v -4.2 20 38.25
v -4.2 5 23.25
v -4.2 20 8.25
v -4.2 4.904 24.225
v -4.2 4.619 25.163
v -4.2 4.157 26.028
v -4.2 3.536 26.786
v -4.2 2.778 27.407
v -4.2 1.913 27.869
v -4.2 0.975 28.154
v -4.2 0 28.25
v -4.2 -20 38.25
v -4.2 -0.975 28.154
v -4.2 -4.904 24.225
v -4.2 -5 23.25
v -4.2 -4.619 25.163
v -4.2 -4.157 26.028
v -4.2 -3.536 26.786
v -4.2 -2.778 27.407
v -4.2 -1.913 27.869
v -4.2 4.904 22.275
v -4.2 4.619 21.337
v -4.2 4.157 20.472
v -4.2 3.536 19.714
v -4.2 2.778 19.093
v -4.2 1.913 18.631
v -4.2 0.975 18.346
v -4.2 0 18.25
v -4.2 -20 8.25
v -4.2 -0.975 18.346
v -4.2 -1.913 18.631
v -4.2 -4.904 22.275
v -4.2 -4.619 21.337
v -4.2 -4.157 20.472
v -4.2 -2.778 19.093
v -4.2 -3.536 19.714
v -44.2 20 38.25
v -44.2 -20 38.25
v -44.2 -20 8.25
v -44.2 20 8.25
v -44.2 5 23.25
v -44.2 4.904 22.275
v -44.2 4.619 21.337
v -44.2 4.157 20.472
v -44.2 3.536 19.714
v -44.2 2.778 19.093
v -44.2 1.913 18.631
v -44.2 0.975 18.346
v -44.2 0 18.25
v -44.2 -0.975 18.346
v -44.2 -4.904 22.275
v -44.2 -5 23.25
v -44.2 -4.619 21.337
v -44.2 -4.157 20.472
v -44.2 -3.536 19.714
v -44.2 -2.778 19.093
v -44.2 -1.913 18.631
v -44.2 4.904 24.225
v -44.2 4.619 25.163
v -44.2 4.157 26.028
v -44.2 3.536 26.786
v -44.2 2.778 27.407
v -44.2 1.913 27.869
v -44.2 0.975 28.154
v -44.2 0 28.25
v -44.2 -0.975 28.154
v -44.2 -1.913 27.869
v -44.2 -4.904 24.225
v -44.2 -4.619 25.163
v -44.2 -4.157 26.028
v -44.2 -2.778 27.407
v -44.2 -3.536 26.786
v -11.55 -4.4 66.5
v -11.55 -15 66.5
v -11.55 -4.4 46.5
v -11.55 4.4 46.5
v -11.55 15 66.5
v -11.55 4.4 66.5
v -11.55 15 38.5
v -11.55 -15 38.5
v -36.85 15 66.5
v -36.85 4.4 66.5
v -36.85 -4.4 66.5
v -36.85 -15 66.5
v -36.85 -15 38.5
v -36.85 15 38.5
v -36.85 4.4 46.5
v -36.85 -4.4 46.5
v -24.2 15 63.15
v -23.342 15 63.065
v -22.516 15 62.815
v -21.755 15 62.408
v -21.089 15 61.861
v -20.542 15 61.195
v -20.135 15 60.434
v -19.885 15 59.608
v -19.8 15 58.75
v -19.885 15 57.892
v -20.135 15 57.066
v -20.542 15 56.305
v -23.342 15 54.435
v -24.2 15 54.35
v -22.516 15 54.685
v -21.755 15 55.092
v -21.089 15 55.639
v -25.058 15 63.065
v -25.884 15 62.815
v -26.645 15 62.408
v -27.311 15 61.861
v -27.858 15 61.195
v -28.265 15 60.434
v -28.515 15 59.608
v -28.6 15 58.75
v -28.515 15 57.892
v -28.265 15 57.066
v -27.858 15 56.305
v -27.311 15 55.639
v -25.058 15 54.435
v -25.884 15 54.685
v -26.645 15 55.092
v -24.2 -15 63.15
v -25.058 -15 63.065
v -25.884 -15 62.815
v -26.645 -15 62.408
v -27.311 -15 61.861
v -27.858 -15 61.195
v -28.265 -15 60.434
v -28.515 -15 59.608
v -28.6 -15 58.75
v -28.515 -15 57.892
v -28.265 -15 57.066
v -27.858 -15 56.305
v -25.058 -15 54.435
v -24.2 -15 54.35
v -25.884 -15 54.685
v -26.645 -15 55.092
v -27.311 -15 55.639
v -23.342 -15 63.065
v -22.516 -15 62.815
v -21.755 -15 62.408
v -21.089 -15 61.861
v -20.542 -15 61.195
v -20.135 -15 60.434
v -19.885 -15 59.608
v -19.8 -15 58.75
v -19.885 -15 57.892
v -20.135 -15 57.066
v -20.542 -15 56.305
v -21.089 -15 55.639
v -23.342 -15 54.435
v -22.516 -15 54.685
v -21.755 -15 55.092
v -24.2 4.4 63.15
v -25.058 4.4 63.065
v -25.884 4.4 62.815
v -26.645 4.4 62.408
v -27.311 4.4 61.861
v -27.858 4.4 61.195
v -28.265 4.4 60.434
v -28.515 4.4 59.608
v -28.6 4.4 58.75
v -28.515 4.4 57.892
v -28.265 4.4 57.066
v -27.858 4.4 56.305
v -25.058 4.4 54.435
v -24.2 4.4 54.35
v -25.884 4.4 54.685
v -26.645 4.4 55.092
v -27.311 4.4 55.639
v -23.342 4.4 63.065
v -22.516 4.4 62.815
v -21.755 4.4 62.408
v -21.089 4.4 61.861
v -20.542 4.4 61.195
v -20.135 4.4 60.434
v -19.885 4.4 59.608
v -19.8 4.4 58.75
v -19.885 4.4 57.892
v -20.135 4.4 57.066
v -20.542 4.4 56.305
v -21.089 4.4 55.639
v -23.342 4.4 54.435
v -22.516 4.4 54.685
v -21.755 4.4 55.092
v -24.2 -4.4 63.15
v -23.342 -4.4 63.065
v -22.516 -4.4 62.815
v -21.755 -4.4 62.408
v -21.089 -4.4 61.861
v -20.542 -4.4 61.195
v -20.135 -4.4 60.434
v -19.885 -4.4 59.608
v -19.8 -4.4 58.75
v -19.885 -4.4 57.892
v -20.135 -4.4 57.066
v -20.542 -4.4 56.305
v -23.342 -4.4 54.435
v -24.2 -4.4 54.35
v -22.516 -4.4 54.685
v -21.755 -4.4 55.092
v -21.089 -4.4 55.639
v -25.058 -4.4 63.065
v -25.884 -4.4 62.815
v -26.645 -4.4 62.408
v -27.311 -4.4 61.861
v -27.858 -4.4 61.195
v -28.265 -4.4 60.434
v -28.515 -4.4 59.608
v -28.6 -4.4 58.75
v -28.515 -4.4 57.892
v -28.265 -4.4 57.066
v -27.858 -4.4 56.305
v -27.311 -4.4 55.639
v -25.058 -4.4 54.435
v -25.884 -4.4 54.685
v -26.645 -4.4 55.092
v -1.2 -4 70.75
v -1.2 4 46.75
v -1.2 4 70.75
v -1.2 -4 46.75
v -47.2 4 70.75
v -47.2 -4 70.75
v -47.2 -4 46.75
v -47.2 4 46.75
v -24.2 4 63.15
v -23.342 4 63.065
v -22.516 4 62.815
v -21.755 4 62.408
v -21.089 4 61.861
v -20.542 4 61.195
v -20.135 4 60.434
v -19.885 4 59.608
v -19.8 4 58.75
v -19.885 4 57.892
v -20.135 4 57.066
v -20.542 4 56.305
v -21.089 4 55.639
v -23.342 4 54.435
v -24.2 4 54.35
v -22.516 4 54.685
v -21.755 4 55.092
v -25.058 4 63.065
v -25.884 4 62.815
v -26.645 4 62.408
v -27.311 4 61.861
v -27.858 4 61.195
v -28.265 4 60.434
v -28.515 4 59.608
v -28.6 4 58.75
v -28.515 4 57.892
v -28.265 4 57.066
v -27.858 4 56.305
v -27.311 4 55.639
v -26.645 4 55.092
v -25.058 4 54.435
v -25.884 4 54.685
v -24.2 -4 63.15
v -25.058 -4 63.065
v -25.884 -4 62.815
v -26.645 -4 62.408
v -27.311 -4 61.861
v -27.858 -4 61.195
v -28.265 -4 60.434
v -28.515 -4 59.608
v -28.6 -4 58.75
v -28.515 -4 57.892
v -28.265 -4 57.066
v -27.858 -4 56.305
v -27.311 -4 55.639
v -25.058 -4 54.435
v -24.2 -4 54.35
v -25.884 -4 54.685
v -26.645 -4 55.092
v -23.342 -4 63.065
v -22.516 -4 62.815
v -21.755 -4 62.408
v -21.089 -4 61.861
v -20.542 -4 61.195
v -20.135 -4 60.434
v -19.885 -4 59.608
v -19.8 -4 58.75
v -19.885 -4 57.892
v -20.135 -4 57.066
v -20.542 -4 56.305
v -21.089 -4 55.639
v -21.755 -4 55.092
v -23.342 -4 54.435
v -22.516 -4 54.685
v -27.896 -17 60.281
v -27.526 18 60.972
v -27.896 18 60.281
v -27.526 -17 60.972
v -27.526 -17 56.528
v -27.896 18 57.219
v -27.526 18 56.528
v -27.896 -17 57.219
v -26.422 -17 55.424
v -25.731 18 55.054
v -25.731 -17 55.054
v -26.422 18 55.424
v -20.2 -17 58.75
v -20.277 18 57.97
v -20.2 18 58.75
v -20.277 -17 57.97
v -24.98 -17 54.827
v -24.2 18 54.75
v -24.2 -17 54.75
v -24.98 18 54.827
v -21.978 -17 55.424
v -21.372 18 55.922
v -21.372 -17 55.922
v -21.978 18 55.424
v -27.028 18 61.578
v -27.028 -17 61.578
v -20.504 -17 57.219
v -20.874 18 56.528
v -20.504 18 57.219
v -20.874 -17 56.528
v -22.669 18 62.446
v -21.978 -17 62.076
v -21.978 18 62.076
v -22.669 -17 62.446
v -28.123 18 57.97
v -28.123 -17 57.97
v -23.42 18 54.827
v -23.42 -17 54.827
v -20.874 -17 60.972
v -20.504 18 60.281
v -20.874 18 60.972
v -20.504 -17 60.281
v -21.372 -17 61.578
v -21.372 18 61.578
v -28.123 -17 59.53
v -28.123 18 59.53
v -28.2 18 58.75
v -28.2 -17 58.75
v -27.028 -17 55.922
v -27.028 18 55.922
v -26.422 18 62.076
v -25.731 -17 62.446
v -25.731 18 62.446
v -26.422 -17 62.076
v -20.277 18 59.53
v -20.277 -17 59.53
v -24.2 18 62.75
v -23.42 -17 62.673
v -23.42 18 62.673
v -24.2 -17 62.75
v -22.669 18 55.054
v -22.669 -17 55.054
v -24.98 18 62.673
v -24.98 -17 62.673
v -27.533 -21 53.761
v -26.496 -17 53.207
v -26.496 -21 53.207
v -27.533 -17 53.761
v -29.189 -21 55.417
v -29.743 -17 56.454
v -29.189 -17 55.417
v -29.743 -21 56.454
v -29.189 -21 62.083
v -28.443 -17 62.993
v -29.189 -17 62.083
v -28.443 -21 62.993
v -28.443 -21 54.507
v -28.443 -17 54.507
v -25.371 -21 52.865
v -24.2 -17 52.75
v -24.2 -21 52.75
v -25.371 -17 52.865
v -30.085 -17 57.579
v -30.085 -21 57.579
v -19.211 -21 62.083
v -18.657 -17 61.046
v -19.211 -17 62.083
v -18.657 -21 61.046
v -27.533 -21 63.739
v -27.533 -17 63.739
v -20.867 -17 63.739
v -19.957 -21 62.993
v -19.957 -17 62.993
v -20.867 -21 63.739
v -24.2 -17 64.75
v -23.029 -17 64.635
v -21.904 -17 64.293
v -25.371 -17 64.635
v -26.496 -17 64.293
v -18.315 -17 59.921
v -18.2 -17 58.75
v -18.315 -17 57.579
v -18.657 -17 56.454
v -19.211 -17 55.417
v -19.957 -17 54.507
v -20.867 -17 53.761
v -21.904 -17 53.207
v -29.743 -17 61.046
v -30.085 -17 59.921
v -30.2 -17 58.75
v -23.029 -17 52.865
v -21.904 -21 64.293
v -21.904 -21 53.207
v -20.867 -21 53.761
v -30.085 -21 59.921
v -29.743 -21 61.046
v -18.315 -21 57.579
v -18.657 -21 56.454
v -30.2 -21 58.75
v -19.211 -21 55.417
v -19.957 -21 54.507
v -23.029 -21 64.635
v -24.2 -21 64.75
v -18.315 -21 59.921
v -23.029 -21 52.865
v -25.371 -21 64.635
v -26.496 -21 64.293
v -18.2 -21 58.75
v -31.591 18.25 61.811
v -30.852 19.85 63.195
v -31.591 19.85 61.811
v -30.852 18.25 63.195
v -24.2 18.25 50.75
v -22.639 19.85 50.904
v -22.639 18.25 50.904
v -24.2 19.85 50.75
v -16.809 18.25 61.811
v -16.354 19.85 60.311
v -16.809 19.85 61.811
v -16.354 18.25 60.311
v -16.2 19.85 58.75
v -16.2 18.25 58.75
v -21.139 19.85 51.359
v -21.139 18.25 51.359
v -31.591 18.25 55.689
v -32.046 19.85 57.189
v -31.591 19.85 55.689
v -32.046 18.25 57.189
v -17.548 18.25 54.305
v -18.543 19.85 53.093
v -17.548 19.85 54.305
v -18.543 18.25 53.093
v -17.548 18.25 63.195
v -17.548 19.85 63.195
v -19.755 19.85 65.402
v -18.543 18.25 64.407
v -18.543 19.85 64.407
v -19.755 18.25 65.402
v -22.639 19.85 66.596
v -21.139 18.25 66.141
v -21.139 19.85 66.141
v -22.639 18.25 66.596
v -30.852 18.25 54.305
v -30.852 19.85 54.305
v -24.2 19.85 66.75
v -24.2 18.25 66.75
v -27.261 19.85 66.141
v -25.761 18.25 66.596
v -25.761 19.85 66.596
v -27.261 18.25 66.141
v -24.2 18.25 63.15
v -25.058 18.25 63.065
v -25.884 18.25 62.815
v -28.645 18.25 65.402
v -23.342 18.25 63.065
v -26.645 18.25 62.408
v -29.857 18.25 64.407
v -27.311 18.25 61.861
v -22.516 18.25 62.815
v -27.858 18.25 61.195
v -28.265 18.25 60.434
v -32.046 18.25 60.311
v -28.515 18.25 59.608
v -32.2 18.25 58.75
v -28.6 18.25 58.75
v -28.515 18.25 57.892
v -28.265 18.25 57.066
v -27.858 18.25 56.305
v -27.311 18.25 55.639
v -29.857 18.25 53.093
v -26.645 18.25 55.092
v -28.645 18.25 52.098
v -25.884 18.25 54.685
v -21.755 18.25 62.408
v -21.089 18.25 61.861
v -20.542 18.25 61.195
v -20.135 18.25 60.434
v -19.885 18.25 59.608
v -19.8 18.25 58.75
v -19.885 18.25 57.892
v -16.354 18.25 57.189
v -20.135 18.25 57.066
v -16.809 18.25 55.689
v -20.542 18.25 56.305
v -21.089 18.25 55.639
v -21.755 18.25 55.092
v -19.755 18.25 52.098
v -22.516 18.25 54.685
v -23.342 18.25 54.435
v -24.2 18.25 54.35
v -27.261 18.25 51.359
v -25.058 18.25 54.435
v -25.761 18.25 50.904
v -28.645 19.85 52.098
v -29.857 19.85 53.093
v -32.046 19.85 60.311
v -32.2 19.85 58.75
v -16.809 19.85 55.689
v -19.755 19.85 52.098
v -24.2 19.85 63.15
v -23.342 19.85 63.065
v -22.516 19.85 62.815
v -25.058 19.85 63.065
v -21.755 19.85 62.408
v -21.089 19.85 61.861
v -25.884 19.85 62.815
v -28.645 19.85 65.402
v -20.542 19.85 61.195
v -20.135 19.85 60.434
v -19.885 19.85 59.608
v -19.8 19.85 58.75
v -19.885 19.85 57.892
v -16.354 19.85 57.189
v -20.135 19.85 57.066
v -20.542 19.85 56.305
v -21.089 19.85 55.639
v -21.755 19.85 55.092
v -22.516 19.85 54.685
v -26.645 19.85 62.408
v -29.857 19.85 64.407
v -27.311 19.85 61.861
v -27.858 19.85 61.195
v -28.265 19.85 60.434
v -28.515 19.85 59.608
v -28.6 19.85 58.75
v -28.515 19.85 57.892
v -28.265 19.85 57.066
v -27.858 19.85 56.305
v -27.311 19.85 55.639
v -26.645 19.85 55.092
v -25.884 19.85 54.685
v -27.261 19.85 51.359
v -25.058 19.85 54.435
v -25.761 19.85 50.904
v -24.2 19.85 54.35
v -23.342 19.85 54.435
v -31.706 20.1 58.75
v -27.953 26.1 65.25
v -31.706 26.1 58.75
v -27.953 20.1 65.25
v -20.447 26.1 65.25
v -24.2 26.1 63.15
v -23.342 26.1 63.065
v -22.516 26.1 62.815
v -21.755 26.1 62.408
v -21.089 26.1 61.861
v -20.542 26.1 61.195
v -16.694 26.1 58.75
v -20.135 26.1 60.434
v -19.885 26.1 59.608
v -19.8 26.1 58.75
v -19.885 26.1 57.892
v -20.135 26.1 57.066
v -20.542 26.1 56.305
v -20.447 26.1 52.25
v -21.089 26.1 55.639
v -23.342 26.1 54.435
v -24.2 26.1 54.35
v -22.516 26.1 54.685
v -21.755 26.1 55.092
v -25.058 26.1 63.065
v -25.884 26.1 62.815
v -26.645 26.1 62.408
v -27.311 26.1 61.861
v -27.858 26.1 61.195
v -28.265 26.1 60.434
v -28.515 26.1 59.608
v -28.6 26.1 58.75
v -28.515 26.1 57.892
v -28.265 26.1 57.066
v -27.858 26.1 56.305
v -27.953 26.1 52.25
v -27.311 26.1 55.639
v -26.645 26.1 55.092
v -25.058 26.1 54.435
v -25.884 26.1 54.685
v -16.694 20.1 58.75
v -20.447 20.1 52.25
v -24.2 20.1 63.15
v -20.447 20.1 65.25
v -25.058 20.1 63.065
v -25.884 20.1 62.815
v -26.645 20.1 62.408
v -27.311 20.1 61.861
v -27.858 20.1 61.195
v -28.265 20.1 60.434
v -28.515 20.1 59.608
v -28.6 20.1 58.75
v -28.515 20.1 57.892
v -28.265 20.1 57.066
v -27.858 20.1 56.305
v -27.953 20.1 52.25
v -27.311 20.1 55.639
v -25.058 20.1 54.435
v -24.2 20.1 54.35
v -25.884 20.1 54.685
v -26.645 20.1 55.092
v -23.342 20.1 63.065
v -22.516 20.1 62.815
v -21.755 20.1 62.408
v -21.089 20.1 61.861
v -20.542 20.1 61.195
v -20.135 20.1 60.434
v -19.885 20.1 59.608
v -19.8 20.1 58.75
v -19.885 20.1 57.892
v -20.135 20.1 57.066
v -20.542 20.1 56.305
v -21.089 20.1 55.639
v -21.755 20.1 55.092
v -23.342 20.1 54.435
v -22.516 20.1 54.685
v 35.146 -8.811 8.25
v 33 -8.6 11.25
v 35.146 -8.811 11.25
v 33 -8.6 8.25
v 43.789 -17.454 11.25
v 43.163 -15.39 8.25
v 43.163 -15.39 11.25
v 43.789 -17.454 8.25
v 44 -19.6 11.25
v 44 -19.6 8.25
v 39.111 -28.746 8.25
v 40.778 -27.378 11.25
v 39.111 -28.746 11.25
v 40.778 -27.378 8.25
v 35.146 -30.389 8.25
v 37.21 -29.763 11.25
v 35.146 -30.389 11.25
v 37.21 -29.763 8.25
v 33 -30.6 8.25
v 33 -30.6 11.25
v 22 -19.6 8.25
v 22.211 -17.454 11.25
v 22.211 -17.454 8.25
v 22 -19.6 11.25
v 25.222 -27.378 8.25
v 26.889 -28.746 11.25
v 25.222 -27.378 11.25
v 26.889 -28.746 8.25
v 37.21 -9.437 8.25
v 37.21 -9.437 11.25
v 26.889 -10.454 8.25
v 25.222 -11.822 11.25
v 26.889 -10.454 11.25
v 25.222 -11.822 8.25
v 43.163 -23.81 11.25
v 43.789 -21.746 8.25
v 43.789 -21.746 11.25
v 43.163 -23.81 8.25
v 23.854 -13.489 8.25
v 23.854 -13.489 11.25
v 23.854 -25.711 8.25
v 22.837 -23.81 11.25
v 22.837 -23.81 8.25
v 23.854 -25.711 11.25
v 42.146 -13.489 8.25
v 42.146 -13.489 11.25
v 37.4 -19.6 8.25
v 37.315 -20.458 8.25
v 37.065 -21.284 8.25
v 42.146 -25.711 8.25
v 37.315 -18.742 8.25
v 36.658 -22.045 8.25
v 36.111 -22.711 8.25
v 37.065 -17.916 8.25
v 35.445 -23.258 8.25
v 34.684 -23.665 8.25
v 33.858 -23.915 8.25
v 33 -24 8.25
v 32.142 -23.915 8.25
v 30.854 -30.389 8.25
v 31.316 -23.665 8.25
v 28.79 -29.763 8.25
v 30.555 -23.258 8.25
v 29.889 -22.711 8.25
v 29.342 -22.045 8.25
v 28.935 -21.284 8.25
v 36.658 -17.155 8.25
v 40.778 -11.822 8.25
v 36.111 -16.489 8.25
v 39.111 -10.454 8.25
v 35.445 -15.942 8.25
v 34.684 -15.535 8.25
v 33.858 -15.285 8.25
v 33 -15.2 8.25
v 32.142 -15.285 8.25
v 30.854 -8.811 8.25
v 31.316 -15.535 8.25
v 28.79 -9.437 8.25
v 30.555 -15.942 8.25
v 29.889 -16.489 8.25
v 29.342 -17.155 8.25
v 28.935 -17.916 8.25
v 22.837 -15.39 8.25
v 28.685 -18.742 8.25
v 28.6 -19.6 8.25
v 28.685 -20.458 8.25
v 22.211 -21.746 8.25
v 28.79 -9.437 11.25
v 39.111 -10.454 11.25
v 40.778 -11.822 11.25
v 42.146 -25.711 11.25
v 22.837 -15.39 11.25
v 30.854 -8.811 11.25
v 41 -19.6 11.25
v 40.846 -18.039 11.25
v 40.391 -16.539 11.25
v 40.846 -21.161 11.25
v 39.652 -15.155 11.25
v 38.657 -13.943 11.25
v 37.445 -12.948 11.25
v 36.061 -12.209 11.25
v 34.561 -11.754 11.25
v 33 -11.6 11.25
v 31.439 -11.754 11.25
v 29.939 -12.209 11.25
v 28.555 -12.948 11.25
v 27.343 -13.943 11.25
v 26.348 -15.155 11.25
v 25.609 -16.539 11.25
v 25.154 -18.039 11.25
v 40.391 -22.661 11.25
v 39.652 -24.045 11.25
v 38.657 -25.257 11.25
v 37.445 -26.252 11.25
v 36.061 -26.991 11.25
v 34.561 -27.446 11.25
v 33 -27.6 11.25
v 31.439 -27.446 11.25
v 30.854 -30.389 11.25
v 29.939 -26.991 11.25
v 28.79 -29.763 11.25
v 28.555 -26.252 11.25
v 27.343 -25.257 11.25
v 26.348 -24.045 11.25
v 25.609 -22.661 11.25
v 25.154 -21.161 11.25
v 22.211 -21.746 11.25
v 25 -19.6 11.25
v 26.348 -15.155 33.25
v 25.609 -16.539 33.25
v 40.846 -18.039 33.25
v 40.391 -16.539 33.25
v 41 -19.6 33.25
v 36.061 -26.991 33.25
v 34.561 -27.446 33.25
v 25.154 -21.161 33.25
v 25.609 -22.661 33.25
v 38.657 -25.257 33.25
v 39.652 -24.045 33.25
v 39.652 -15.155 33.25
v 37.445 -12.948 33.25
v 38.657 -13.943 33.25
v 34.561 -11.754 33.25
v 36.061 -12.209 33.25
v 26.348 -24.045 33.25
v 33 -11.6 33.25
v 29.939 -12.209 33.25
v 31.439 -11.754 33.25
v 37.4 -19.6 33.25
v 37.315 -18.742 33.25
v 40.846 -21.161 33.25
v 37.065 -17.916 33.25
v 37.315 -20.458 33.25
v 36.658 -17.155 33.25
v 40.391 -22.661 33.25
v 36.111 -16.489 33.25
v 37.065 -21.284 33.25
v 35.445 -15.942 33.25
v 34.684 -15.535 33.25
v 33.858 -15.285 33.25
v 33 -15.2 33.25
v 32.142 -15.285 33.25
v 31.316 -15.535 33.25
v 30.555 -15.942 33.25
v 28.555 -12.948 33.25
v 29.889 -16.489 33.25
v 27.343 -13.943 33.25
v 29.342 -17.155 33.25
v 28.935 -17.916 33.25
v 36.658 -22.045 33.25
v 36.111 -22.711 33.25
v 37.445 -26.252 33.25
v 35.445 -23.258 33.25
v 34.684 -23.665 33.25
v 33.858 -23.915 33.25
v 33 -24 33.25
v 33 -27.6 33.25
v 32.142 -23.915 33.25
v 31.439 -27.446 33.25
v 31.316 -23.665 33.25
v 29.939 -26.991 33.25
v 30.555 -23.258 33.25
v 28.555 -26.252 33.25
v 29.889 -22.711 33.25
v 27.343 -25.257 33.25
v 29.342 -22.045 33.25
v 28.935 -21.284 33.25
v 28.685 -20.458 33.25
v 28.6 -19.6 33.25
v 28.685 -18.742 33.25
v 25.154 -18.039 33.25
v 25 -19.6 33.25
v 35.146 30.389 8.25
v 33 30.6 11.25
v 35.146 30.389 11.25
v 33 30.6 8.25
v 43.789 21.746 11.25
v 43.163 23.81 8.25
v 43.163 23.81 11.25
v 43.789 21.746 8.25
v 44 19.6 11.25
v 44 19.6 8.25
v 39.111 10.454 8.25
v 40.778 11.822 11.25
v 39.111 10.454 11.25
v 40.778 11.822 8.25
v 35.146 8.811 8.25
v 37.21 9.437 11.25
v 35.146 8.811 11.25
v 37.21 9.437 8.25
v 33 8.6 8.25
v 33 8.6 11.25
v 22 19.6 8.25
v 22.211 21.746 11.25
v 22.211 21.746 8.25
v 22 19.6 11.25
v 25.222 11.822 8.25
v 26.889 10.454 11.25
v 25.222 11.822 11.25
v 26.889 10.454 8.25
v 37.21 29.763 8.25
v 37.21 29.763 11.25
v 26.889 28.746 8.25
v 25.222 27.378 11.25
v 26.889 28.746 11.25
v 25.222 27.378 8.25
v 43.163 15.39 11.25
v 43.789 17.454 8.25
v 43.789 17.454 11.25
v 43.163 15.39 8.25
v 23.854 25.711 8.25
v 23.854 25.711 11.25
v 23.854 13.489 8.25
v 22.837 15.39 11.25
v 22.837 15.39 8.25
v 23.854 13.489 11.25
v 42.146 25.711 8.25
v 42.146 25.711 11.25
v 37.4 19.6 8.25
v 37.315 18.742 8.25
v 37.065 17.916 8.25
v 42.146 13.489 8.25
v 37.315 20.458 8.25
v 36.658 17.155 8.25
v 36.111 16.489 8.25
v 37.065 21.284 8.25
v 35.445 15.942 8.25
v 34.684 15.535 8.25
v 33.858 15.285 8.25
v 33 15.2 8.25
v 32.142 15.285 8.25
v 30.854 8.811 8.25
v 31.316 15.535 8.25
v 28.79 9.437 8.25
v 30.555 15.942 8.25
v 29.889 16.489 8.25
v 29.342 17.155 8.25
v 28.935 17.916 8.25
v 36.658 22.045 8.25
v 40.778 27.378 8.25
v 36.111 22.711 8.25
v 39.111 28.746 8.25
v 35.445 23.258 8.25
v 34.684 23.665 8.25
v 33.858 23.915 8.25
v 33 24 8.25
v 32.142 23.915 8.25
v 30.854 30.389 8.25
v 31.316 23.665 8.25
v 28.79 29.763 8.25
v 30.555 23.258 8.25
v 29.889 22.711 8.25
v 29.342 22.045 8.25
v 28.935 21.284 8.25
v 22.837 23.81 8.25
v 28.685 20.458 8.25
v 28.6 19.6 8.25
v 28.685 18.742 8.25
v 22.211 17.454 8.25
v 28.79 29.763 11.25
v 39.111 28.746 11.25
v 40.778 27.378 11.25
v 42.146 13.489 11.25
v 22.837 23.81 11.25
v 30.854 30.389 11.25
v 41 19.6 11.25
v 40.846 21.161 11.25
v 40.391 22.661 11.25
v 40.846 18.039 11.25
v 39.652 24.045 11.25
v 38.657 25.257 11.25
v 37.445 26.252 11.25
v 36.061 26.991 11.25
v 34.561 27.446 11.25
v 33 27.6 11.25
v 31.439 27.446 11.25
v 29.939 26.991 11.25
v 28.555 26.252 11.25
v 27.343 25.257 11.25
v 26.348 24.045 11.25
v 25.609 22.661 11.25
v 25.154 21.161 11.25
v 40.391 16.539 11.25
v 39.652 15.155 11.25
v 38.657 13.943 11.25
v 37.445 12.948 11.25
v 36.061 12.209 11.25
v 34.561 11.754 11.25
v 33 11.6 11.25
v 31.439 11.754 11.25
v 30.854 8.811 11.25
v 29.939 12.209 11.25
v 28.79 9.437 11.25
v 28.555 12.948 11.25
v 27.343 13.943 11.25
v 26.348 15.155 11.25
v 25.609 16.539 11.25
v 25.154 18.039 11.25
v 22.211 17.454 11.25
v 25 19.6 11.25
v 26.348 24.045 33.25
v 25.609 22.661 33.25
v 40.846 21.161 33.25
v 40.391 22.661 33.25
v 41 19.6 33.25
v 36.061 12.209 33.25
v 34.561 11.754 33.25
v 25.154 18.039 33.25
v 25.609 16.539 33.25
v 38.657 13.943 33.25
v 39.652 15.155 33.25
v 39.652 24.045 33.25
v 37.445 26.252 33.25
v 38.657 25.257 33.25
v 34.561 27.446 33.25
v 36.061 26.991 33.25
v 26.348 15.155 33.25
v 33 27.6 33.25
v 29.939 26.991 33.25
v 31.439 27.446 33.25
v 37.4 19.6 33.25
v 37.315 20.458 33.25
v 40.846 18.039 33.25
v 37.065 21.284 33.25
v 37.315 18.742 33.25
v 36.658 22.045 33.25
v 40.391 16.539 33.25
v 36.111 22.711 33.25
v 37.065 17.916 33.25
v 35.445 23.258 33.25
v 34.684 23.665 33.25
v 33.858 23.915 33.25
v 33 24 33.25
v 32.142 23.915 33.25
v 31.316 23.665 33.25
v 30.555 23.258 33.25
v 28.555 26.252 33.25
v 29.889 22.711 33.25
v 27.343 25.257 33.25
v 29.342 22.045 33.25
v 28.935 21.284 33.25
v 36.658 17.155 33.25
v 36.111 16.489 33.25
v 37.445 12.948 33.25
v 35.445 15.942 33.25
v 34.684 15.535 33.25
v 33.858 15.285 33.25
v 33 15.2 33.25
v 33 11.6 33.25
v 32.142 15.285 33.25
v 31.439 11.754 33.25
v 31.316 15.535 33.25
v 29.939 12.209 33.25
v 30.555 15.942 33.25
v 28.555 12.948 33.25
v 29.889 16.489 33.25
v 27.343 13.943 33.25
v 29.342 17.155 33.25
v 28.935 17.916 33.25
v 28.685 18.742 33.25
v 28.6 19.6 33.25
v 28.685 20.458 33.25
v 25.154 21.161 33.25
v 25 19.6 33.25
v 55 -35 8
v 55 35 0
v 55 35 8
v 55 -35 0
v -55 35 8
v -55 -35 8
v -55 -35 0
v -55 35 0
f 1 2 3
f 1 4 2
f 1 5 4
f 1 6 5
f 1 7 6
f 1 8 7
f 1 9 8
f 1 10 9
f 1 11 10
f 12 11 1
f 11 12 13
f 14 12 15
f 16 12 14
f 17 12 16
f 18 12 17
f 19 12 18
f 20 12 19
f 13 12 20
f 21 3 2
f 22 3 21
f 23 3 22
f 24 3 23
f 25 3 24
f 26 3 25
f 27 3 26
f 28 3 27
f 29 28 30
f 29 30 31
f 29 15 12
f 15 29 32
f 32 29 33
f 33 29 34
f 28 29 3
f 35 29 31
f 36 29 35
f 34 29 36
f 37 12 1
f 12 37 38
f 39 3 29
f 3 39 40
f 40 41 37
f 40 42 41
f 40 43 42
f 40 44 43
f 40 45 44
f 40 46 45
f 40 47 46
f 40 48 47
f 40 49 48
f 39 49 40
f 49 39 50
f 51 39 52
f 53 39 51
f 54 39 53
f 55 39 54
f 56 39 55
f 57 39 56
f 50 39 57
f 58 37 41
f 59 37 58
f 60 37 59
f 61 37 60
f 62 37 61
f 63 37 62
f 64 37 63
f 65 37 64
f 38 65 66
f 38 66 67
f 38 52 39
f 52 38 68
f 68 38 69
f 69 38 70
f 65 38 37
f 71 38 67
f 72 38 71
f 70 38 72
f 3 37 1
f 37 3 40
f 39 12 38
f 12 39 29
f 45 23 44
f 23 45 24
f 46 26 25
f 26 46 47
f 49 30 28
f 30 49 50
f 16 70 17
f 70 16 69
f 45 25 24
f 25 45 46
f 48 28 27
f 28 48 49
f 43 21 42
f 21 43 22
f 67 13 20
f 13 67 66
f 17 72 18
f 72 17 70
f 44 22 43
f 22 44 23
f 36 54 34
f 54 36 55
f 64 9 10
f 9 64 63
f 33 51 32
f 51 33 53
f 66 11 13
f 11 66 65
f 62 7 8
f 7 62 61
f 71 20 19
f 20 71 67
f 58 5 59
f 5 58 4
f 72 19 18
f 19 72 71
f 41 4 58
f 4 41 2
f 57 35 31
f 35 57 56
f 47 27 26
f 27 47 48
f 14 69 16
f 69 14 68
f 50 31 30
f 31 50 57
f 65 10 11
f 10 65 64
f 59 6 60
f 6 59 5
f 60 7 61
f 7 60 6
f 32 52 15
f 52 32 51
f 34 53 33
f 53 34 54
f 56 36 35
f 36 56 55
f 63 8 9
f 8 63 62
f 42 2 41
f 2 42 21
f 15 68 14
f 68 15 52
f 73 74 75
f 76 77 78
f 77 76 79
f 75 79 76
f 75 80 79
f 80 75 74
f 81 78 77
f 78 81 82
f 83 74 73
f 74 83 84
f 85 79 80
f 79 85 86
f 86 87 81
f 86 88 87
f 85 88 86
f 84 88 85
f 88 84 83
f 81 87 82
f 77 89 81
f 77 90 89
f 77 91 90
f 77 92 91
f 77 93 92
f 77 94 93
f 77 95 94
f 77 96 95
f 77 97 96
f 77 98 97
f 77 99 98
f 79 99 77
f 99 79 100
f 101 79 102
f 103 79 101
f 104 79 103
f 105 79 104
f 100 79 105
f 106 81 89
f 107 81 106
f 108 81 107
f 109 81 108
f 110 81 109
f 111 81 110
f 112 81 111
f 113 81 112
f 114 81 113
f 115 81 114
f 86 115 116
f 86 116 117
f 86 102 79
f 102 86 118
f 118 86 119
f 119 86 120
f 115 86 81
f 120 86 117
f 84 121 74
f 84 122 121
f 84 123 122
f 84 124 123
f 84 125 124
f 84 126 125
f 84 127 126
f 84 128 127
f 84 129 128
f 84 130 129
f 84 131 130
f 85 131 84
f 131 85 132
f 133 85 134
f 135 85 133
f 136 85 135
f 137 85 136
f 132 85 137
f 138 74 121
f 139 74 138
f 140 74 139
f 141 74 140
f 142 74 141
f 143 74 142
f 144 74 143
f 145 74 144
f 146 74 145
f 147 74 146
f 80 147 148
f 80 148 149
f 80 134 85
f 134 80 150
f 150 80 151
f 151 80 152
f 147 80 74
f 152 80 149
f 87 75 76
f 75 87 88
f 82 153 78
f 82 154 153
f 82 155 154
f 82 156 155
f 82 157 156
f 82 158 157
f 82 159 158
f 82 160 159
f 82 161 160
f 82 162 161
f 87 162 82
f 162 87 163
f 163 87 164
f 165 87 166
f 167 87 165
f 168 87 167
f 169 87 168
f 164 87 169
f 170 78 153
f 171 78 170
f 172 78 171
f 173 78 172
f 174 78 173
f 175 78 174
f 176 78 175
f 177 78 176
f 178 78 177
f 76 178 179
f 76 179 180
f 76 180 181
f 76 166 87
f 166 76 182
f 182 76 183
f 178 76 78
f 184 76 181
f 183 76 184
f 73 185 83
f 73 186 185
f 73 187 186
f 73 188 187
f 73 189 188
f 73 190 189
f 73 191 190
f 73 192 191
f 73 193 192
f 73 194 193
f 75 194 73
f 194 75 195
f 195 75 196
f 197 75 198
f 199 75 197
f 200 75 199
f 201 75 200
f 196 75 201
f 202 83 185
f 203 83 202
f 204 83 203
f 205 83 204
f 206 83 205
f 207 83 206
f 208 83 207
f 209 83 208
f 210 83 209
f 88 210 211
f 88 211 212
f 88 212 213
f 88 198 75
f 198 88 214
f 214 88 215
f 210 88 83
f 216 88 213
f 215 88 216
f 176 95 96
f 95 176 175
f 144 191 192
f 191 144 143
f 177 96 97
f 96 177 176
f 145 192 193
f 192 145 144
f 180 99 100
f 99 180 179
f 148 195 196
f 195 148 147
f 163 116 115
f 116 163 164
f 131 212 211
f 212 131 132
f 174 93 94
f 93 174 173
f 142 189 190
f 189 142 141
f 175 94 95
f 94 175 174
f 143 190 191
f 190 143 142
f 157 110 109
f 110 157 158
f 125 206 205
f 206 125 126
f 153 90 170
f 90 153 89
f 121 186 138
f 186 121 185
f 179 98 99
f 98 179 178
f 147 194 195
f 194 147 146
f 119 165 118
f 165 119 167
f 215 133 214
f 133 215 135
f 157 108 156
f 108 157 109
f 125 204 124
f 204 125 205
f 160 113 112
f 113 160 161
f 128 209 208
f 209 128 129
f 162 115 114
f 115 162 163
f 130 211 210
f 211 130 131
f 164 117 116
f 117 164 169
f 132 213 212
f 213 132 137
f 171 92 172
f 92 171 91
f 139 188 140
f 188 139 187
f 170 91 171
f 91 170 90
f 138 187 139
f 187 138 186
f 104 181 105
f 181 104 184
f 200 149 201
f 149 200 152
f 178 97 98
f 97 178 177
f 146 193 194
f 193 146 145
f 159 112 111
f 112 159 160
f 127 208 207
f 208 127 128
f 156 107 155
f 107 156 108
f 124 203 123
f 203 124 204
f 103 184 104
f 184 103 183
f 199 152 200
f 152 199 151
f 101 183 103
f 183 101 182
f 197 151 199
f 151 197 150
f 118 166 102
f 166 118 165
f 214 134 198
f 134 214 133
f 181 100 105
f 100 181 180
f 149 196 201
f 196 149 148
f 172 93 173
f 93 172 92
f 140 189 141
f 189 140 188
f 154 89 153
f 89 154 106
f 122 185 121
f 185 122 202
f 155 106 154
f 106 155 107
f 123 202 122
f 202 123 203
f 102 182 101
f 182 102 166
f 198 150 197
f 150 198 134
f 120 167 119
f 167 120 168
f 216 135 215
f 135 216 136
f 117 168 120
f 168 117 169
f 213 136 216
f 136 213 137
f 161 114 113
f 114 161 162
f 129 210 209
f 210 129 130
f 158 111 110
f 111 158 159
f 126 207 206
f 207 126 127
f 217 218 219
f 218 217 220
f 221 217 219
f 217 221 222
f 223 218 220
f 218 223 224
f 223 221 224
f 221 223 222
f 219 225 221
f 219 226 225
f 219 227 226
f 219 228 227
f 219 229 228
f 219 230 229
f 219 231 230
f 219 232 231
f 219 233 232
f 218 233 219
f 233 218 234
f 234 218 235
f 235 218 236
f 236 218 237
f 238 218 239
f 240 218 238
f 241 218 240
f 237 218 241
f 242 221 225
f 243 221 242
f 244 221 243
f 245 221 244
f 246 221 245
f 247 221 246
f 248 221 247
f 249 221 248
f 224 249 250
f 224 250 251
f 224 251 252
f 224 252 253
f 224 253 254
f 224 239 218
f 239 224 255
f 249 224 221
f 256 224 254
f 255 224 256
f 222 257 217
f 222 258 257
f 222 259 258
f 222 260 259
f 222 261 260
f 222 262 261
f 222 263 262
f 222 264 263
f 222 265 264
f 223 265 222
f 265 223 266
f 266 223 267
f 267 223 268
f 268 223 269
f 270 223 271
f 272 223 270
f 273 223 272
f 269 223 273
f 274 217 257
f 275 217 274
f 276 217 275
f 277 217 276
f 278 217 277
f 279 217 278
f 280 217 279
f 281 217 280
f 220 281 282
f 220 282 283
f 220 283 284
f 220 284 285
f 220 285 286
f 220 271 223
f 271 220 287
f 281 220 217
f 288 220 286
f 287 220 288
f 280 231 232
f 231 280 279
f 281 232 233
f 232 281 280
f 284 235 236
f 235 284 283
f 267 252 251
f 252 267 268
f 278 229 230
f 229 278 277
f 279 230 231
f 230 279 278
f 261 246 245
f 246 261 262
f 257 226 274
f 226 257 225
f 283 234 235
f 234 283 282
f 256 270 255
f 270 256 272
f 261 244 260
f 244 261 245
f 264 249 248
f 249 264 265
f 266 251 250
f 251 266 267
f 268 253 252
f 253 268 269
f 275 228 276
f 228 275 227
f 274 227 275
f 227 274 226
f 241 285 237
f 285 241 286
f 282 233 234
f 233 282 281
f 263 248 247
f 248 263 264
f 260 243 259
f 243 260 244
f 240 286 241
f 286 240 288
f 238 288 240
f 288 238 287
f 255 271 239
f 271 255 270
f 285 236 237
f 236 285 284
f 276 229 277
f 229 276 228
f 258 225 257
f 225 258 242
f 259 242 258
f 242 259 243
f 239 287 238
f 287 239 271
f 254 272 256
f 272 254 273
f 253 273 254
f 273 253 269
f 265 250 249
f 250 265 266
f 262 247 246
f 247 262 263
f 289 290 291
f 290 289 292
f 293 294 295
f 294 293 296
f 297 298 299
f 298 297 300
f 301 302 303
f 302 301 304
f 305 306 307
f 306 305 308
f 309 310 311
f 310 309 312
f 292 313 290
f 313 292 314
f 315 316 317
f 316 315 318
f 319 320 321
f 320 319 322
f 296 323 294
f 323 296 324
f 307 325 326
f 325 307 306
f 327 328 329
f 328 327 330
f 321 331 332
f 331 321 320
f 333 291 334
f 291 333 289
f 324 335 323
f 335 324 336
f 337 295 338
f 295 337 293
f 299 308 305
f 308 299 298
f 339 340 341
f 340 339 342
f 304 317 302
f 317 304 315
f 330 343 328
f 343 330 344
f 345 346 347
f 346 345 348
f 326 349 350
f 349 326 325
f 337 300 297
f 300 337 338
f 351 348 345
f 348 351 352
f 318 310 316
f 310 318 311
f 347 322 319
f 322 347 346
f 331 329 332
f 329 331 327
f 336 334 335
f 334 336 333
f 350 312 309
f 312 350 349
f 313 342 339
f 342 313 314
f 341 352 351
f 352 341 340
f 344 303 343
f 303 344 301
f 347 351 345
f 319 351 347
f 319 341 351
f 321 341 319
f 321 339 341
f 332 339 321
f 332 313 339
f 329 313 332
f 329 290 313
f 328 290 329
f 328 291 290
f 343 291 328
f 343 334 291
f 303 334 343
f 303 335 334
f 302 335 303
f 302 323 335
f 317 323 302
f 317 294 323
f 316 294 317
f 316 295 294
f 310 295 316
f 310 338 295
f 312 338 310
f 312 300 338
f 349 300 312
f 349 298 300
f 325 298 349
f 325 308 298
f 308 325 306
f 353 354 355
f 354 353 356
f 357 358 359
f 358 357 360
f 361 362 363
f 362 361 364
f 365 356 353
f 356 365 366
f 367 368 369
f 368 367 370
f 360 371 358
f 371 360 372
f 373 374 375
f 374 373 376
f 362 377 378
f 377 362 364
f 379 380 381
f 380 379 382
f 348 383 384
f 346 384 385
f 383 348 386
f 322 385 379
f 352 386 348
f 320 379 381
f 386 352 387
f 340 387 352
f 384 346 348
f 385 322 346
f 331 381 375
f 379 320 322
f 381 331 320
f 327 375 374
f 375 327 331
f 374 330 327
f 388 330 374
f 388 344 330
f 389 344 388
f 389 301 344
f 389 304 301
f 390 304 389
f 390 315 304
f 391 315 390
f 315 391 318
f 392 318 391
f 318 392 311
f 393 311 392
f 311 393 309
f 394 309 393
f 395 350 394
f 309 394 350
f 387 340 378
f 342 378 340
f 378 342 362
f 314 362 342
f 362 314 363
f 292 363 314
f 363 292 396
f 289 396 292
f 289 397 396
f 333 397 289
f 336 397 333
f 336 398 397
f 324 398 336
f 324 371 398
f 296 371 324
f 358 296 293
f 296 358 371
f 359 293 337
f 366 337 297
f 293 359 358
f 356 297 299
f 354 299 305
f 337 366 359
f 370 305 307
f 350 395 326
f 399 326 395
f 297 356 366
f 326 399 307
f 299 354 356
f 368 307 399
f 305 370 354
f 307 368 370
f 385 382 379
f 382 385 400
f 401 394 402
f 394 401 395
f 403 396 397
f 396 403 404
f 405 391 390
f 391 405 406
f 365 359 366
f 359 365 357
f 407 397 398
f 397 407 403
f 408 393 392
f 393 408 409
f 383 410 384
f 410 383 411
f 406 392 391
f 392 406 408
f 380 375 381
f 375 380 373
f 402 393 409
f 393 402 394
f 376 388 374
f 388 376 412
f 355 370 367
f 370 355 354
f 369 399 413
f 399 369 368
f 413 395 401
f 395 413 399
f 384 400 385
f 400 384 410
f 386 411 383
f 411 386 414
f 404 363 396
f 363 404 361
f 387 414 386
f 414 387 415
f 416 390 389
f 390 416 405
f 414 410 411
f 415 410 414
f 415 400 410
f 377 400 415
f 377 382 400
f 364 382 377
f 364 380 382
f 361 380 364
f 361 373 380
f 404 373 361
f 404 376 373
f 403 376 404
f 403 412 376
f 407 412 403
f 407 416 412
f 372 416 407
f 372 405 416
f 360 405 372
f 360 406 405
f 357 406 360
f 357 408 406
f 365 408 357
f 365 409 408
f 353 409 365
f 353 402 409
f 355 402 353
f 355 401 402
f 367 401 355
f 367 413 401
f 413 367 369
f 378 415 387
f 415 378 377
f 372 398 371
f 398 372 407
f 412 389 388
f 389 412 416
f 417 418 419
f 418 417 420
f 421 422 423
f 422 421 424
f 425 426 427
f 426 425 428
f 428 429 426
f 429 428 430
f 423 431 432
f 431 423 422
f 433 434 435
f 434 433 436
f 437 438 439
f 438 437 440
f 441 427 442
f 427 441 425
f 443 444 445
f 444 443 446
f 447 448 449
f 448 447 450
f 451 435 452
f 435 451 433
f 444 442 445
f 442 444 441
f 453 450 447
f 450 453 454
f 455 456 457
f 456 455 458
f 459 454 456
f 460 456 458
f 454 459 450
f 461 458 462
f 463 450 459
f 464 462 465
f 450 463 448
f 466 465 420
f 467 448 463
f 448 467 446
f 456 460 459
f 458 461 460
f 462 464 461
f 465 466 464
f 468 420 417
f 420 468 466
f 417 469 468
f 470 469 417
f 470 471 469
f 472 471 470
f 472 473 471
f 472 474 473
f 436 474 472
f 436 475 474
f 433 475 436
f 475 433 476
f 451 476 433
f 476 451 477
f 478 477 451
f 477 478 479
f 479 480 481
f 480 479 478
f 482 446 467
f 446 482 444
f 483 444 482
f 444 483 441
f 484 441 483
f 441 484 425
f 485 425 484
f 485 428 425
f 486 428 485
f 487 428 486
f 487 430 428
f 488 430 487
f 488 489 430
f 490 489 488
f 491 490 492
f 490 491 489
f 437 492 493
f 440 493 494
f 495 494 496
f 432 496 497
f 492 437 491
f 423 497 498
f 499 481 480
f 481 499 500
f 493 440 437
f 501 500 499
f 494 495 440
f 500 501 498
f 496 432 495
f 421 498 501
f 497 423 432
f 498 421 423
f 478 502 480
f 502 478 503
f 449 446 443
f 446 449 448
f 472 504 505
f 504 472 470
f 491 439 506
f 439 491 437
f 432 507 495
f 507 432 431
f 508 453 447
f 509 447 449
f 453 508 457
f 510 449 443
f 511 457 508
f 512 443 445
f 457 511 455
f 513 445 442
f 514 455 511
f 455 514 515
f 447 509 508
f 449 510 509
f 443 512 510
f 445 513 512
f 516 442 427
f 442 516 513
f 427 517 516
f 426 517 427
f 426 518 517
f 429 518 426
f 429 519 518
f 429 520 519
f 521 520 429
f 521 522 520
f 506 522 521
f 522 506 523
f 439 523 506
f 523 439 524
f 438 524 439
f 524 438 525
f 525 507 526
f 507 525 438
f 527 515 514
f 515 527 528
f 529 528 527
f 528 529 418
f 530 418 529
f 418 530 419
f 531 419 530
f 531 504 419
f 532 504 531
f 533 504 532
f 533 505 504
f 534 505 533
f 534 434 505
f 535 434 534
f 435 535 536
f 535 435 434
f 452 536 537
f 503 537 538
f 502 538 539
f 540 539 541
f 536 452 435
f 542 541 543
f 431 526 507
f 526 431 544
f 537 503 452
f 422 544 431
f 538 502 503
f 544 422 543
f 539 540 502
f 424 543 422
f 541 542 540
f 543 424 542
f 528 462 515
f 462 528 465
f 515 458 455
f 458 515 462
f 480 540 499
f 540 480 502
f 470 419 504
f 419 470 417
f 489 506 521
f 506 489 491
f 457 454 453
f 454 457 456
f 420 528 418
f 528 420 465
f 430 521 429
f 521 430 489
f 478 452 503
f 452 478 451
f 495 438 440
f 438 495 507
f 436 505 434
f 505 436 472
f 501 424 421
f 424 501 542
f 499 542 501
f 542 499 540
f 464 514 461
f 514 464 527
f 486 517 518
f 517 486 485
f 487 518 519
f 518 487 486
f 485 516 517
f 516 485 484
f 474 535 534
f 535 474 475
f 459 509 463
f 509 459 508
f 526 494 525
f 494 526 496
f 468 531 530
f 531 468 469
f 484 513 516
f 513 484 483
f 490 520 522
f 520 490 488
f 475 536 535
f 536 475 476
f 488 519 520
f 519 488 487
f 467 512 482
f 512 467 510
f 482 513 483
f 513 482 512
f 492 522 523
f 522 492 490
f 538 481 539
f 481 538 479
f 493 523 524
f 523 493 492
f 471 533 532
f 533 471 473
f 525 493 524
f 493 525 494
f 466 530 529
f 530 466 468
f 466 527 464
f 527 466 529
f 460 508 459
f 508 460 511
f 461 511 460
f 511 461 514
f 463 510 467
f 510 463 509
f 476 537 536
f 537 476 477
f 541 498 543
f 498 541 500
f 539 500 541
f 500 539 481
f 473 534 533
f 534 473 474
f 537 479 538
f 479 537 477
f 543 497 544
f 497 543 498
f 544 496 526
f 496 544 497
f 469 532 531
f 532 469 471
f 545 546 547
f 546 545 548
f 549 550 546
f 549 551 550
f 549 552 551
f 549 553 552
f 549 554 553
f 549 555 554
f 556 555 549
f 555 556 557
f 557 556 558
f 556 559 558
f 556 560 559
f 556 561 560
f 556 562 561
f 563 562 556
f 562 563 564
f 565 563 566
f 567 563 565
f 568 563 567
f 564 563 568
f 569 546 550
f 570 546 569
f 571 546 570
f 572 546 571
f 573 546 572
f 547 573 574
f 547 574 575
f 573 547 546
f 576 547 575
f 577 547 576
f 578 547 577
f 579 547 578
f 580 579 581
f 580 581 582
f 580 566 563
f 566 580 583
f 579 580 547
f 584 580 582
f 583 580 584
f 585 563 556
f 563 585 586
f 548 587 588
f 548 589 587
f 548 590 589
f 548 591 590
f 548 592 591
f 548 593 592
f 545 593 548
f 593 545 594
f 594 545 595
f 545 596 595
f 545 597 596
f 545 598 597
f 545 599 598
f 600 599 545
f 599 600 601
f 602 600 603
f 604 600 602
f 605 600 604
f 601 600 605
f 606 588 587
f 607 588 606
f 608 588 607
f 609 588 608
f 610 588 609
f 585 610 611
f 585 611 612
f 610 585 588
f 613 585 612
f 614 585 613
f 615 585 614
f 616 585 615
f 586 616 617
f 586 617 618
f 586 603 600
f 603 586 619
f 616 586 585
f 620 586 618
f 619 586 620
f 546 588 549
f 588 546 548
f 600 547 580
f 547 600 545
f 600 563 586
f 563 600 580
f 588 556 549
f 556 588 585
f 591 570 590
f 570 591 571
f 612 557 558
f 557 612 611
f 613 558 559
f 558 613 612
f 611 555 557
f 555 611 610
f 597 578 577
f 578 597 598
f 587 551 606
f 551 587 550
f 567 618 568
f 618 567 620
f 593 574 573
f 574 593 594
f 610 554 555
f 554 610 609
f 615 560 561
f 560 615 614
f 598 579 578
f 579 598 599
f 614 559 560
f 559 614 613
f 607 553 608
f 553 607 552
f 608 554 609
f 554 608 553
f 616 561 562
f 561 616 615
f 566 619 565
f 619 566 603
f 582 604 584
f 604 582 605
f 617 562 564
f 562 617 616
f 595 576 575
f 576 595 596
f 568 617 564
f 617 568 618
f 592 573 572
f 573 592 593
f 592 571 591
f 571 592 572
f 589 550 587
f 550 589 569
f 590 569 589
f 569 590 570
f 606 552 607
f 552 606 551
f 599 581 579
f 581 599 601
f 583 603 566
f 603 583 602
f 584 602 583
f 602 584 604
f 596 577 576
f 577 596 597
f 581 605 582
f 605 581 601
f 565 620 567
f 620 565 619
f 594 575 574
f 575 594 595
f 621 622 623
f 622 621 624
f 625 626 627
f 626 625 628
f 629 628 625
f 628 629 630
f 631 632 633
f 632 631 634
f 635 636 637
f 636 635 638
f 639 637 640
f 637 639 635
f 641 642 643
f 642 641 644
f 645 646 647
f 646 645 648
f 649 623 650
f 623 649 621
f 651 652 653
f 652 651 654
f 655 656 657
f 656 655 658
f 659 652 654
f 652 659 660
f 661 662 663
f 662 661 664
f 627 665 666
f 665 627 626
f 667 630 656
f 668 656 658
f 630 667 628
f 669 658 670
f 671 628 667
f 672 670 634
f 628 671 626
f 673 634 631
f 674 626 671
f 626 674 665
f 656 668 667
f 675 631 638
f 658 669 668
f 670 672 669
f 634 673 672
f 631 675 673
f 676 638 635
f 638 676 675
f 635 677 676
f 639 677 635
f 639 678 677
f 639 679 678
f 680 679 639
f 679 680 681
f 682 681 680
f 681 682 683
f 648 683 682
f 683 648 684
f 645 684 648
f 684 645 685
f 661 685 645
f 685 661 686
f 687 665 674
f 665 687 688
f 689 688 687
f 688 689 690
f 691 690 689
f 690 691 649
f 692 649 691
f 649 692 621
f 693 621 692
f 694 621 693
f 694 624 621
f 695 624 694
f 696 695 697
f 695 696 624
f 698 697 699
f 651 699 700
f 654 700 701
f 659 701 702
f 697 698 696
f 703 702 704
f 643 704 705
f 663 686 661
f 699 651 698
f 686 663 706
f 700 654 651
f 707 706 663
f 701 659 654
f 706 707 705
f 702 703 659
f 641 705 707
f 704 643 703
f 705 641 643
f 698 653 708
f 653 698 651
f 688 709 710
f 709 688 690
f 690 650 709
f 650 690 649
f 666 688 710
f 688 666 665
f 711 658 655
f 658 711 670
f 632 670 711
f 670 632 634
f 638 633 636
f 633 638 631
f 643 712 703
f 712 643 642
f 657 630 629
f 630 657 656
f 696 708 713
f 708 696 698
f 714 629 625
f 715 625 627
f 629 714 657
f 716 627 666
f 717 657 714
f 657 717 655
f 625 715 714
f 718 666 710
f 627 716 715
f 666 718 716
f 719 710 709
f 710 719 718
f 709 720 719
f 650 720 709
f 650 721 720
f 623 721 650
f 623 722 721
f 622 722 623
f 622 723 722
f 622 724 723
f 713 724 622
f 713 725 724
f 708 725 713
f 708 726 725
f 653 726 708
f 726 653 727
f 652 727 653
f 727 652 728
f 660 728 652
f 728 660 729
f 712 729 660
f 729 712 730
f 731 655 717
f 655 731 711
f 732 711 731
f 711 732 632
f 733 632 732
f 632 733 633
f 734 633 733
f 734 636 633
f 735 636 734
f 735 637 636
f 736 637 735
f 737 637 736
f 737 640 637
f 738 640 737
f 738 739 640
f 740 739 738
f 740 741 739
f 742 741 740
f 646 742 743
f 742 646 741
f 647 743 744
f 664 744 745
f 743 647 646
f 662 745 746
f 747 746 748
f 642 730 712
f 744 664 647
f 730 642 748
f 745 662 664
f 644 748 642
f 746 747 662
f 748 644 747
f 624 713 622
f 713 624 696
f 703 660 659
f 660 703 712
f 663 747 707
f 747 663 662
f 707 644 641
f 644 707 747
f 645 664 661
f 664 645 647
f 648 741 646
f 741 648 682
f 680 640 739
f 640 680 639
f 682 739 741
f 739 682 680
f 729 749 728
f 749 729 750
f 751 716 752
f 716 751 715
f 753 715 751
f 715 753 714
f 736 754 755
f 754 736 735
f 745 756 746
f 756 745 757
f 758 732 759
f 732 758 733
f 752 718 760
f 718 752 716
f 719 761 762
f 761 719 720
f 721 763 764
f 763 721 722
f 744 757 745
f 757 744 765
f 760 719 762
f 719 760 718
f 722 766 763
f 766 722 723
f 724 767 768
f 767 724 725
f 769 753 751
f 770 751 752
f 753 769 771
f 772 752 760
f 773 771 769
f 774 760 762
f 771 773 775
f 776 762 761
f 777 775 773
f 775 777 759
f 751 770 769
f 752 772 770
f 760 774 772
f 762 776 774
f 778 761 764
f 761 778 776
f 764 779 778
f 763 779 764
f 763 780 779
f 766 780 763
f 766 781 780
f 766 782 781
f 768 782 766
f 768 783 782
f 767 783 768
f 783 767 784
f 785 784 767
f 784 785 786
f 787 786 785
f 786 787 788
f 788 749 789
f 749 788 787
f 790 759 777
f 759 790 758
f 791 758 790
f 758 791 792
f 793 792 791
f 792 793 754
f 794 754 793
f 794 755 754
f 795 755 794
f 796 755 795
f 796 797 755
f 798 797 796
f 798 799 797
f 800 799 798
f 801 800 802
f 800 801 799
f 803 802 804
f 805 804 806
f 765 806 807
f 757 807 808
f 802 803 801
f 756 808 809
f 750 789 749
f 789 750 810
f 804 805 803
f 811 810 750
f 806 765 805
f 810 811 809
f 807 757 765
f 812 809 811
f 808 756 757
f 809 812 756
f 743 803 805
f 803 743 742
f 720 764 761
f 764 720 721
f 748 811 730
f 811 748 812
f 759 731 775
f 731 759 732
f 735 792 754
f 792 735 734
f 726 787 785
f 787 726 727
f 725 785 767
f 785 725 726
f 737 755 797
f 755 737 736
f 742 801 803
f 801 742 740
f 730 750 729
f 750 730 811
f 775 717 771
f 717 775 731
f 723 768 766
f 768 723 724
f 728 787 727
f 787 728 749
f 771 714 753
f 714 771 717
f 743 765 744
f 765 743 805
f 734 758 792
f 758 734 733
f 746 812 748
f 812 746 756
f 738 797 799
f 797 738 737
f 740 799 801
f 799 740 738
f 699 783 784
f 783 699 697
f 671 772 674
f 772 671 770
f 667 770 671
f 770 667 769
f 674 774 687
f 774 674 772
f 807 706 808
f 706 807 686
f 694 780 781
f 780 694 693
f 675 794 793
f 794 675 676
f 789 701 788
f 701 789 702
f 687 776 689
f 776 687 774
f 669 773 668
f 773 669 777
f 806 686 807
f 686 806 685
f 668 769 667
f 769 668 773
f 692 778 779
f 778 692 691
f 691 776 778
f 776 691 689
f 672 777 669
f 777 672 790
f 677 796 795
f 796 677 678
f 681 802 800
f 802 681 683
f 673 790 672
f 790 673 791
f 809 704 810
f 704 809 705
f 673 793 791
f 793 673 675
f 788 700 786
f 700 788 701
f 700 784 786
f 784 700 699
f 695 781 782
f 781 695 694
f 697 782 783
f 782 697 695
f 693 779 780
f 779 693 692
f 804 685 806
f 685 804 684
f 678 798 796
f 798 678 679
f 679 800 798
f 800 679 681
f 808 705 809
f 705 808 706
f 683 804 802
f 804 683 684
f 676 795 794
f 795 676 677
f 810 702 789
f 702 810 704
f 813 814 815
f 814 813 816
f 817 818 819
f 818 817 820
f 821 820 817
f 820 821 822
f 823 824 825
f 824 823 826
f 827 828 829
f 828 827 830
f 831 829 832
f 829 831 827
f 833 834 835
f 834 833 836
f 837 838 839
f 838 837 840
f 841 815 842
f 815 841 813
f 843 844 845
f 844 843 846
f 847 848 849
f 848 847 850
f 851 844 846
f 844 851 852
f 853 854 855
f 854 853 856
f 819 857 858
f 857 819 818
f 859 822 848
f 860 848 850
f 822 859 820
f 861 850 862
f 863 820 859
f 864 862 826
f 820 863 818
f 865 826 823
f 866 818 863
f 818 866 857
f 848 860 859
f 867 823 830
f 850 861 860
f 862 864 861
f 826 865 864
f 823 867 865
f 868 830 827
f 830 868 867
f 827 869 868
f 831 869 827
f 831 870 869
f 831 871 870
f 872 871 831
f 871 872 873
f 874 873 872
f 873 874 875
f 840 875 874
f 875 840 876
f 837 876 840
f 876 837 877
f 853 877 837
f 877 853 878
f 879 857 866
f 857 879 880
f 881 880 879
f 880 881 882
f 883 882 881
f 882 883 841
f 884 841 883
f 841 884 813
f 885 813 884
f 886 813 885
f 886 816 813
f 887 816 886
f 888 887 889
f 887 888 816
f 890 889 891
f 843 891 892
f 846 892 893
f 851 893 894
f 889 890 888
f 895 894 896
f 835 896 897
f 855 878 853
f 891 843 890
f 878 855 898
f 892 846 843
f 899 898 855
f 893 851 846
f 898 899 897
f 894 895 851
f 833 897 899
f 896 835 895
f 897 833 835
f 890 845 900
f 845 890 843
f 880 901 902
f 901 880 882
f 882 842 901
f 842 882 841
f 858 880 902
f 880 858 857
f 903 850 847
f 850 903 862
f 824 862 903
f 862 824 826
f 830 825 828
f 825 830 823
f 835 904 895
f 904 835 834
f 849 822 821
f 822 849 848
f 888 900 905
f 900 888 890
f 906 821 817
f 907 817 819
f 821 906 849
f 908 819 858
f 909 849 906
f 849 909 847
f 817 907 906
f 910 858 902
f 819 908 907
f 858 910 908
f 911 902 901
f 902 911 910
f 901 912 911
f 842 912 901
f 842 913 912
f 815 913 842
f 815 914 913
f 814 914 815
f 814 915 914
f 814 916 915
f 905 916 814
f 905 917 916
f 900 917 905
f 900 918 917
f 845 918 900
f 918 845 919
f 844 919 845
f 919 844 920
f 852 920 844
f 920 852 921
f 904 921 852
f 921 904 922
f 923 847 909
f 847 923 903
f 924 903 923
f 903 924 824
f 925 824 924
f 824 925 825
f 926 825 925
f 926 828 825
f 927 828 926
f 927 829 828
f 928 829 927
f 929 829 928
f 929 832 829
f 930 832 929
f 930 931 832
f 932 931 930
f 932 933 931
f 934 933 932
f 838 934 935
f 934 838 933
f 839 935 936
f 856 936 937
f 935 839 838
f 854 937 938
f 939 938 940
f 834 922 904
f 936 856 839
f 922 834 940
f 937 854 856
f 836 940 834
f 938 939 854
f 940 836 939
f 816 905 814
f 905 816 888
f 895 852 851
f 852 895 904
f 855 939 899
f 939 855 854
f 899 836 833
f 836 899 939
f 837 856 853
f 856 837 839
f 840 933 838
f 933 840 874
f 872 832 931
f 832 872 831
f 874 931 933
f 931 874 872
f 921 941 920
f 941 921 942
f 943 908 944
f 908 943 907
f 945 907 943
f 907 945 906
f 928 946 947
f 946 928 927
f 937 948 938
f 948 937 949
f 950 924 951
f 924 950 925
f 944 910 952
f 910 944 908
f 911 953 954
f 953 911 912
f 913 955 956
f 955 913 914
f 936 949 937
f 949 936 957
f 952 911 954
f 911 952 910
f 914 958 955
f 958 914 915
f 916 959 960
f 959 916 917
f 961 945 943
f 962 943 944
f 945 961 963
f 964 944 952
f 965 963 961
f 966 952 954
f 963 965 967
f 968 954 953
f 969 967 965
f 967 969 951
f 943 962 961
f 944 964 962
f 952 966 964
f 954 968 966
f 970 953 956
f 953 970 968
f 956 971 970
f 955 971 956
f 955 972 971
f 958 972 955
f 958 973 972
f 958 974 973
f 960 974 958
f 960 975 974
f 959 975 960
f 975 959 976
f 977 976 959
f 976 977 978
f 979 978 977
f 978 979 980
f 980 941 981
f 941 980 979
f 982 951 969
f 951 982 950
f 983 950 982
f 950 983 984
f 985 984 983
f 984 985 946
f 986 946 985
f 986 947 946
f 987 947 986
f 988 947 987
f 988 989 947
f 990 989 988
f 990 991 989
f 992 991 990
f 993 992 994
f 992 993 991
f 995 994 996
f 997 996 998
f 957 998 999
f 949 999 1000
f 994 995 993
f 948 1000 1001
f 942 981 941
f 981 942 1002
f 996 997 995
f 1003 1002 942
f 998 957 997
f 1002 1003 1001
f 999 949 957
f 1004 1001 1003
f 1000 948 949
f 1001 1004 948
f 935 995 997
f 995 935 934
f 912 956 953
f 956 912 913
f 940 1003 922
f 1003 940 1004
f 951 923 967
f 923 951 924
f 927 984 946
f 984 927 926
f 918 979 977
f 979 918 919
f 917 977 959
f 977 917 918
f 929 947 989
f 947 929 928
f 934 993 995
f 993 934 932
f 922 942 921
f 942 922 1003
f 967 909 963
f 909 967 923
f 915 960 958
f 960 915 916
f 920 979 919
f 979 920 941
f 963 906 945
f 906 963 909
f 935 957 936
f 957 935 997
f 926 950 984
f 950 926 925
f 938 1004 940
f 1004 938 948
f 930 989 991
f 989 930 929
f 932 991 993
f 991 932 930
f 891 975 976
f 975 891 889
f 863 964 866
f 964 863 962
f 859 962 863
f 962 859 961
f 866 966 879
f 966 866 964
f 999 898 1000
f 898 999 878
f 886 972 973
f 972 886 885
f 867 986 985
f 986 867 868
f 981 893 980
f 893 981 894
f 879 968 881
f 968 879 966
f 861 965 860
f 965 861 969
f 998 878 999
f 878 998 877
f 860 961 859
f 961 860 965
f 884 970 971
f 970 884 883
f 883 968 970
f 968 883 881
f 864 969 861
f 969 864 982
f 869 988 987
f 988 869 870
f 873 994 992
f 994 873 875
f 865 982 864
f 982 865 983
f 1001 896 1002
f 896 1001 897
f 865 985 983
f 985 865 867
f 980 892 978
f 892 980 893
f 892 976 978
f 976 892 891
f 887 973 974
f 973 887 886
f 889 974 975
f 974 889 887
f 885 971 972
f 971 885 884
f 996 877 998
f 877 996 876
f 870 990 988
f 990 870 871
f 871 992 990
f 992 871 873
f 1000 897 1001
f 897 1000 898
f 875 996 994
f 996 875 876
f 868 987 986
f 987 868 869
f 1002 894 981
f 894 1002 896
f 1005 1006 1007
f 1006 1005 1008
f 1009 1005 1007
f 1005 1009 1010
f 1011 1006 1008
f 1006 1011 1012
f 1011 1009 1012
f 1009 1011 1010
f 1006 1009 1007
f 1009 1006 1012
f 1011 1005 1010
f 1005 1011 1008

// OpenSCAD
$fn = 32;

// ------------------------------------------------------------------------
// Indexing jig: plate 110 x 70 mm, pin d8
// Every part is its own module, assembly() places every instance.
// ------------------------------------------------------------------------

// --- part 1 ---
module jig_plate() {
  difference() {
    translate([-55, -35, 0]) cube([110, 70, 8]);
  }
}

// --- part 2 ---
module locator_block() {
  difference() {
    translate([-20, -20, 0]) cube([40, 40, 30]);
    translate([0, 0, 15]) rotate([0, 90, 0]) cylinder(h = 42, d = 10, center = true);
  }
}

// --- part 3 ---
module index_fork() {
  difference() {
    translate([-12.65, -15, 0]) cube([25.3, 30, 28]);
    translate([-13.65, -4.4, 8]) cube([27.3, 8.8, 21]);
    translate([0, 0, 20.25]) rotate([90, 0, 0]) cylinder(h = 32, d = 8.8, center = true);
  }
}

// --- part 4 ---
module index_arm() {
  difference() {
    translate([-23, -4, 0]) cube([46, 8, 24]);
    translate([0, 0, 12]) rotate([90, 0, 0]) cylinder(h = 10, d = 8.8, center = true);
  }
}

// --- part 5 ---
module index_pin() {
  rotate([0, 90, 0]) cylinder(h = 36, d = 8, center = true);
  translate([-21, 0, 0]) rotate([0, 90, 0]) cylinder(h = 4, d = 12);
}

// --- part 6 ---
module pin_washer() {
  difference() {
      translate([0, 0, 0]) cylinder(h = 1.6, d = 16);
      translate([0, 0, -1]) cylinder(h = 3.6, d = 8.8);
    }
}

// --- part 7 ---
module lock_nut() {
  difference() {
    linear_extrude(height = 6) polygon(points = [[7.506, 0], [3.753, 6.5], [-3.753, 6.5], [-7.506, 0], [-3.753, -6.5], [3.753, -6.5]]);
    translate([0, 0, -1]) cylinder(h = 8, d = 8.8);
  }
}

// --- part 8 ---
module guide_bush_a() {
  difference() {
    union() {
      cylinder(h = 3, d = 22);
      translate([0, 0, 3]) cylinder(h = 22, d = 16);
    }
    translate([0, 0, -1]) cylinder(h = 27, d = 8.8);
  }
}

// --- part 9 ---
module guide_bush_b() {
  difference() {
    union() {
      cylinder(h = 3, d = 22);
      translate([0, 0, 3]) cylinder(h = 22, d = 16);
    }
    translate([0, 0, -1]) cylinder(h = 27, d = 8.8);
  }
}

// --- assembly ---
module assembly() {
  color([0.80, 0.24, 0.20]) translate([0, 0, 0]) rotate([0, 0, 0]) jig_plate();
  color([0.20, 0.45, 0.75]) translate([-24.2, 0, 8.25]) rotate([0, 0, 0]) locator_block();
  color([0.25, 0.62, 0.32]) translate([-24.2, 0, 38.5]) rotate([0, 0, 0]) index_fork();
  color([0.92, 0.70, 0.18]) translate([-24.2, 0, 46.75]) rotate([0, 0, 0]) index_arm();
  color([0.58, 0.35, 0.70]) translate([-24.2, 0, 58.75]) rotate([0, 0, 90]) index_pin();
  color([0.16, 0.66, 0.66]) translate([-24.2, 19.85, 58.75]) rotate([90, 0, 0]) pin_washer();
  color([0.85, 0.48, 0.18]) translate([-24.2, 26.1, 58.75]) rotate([90, 0, 0]) lock_nut();
  color([0.55, 0.60, 0.65]) translate([33, -19.6, 8.25]) rotate([0, 0, 0]) guide_bush_a();
  color([0.75, 0.30, 0.55]) translate([33, 19.6, 8.25]) rotate([0, 0, 0]) guide_bush_b();
}

assembly();
